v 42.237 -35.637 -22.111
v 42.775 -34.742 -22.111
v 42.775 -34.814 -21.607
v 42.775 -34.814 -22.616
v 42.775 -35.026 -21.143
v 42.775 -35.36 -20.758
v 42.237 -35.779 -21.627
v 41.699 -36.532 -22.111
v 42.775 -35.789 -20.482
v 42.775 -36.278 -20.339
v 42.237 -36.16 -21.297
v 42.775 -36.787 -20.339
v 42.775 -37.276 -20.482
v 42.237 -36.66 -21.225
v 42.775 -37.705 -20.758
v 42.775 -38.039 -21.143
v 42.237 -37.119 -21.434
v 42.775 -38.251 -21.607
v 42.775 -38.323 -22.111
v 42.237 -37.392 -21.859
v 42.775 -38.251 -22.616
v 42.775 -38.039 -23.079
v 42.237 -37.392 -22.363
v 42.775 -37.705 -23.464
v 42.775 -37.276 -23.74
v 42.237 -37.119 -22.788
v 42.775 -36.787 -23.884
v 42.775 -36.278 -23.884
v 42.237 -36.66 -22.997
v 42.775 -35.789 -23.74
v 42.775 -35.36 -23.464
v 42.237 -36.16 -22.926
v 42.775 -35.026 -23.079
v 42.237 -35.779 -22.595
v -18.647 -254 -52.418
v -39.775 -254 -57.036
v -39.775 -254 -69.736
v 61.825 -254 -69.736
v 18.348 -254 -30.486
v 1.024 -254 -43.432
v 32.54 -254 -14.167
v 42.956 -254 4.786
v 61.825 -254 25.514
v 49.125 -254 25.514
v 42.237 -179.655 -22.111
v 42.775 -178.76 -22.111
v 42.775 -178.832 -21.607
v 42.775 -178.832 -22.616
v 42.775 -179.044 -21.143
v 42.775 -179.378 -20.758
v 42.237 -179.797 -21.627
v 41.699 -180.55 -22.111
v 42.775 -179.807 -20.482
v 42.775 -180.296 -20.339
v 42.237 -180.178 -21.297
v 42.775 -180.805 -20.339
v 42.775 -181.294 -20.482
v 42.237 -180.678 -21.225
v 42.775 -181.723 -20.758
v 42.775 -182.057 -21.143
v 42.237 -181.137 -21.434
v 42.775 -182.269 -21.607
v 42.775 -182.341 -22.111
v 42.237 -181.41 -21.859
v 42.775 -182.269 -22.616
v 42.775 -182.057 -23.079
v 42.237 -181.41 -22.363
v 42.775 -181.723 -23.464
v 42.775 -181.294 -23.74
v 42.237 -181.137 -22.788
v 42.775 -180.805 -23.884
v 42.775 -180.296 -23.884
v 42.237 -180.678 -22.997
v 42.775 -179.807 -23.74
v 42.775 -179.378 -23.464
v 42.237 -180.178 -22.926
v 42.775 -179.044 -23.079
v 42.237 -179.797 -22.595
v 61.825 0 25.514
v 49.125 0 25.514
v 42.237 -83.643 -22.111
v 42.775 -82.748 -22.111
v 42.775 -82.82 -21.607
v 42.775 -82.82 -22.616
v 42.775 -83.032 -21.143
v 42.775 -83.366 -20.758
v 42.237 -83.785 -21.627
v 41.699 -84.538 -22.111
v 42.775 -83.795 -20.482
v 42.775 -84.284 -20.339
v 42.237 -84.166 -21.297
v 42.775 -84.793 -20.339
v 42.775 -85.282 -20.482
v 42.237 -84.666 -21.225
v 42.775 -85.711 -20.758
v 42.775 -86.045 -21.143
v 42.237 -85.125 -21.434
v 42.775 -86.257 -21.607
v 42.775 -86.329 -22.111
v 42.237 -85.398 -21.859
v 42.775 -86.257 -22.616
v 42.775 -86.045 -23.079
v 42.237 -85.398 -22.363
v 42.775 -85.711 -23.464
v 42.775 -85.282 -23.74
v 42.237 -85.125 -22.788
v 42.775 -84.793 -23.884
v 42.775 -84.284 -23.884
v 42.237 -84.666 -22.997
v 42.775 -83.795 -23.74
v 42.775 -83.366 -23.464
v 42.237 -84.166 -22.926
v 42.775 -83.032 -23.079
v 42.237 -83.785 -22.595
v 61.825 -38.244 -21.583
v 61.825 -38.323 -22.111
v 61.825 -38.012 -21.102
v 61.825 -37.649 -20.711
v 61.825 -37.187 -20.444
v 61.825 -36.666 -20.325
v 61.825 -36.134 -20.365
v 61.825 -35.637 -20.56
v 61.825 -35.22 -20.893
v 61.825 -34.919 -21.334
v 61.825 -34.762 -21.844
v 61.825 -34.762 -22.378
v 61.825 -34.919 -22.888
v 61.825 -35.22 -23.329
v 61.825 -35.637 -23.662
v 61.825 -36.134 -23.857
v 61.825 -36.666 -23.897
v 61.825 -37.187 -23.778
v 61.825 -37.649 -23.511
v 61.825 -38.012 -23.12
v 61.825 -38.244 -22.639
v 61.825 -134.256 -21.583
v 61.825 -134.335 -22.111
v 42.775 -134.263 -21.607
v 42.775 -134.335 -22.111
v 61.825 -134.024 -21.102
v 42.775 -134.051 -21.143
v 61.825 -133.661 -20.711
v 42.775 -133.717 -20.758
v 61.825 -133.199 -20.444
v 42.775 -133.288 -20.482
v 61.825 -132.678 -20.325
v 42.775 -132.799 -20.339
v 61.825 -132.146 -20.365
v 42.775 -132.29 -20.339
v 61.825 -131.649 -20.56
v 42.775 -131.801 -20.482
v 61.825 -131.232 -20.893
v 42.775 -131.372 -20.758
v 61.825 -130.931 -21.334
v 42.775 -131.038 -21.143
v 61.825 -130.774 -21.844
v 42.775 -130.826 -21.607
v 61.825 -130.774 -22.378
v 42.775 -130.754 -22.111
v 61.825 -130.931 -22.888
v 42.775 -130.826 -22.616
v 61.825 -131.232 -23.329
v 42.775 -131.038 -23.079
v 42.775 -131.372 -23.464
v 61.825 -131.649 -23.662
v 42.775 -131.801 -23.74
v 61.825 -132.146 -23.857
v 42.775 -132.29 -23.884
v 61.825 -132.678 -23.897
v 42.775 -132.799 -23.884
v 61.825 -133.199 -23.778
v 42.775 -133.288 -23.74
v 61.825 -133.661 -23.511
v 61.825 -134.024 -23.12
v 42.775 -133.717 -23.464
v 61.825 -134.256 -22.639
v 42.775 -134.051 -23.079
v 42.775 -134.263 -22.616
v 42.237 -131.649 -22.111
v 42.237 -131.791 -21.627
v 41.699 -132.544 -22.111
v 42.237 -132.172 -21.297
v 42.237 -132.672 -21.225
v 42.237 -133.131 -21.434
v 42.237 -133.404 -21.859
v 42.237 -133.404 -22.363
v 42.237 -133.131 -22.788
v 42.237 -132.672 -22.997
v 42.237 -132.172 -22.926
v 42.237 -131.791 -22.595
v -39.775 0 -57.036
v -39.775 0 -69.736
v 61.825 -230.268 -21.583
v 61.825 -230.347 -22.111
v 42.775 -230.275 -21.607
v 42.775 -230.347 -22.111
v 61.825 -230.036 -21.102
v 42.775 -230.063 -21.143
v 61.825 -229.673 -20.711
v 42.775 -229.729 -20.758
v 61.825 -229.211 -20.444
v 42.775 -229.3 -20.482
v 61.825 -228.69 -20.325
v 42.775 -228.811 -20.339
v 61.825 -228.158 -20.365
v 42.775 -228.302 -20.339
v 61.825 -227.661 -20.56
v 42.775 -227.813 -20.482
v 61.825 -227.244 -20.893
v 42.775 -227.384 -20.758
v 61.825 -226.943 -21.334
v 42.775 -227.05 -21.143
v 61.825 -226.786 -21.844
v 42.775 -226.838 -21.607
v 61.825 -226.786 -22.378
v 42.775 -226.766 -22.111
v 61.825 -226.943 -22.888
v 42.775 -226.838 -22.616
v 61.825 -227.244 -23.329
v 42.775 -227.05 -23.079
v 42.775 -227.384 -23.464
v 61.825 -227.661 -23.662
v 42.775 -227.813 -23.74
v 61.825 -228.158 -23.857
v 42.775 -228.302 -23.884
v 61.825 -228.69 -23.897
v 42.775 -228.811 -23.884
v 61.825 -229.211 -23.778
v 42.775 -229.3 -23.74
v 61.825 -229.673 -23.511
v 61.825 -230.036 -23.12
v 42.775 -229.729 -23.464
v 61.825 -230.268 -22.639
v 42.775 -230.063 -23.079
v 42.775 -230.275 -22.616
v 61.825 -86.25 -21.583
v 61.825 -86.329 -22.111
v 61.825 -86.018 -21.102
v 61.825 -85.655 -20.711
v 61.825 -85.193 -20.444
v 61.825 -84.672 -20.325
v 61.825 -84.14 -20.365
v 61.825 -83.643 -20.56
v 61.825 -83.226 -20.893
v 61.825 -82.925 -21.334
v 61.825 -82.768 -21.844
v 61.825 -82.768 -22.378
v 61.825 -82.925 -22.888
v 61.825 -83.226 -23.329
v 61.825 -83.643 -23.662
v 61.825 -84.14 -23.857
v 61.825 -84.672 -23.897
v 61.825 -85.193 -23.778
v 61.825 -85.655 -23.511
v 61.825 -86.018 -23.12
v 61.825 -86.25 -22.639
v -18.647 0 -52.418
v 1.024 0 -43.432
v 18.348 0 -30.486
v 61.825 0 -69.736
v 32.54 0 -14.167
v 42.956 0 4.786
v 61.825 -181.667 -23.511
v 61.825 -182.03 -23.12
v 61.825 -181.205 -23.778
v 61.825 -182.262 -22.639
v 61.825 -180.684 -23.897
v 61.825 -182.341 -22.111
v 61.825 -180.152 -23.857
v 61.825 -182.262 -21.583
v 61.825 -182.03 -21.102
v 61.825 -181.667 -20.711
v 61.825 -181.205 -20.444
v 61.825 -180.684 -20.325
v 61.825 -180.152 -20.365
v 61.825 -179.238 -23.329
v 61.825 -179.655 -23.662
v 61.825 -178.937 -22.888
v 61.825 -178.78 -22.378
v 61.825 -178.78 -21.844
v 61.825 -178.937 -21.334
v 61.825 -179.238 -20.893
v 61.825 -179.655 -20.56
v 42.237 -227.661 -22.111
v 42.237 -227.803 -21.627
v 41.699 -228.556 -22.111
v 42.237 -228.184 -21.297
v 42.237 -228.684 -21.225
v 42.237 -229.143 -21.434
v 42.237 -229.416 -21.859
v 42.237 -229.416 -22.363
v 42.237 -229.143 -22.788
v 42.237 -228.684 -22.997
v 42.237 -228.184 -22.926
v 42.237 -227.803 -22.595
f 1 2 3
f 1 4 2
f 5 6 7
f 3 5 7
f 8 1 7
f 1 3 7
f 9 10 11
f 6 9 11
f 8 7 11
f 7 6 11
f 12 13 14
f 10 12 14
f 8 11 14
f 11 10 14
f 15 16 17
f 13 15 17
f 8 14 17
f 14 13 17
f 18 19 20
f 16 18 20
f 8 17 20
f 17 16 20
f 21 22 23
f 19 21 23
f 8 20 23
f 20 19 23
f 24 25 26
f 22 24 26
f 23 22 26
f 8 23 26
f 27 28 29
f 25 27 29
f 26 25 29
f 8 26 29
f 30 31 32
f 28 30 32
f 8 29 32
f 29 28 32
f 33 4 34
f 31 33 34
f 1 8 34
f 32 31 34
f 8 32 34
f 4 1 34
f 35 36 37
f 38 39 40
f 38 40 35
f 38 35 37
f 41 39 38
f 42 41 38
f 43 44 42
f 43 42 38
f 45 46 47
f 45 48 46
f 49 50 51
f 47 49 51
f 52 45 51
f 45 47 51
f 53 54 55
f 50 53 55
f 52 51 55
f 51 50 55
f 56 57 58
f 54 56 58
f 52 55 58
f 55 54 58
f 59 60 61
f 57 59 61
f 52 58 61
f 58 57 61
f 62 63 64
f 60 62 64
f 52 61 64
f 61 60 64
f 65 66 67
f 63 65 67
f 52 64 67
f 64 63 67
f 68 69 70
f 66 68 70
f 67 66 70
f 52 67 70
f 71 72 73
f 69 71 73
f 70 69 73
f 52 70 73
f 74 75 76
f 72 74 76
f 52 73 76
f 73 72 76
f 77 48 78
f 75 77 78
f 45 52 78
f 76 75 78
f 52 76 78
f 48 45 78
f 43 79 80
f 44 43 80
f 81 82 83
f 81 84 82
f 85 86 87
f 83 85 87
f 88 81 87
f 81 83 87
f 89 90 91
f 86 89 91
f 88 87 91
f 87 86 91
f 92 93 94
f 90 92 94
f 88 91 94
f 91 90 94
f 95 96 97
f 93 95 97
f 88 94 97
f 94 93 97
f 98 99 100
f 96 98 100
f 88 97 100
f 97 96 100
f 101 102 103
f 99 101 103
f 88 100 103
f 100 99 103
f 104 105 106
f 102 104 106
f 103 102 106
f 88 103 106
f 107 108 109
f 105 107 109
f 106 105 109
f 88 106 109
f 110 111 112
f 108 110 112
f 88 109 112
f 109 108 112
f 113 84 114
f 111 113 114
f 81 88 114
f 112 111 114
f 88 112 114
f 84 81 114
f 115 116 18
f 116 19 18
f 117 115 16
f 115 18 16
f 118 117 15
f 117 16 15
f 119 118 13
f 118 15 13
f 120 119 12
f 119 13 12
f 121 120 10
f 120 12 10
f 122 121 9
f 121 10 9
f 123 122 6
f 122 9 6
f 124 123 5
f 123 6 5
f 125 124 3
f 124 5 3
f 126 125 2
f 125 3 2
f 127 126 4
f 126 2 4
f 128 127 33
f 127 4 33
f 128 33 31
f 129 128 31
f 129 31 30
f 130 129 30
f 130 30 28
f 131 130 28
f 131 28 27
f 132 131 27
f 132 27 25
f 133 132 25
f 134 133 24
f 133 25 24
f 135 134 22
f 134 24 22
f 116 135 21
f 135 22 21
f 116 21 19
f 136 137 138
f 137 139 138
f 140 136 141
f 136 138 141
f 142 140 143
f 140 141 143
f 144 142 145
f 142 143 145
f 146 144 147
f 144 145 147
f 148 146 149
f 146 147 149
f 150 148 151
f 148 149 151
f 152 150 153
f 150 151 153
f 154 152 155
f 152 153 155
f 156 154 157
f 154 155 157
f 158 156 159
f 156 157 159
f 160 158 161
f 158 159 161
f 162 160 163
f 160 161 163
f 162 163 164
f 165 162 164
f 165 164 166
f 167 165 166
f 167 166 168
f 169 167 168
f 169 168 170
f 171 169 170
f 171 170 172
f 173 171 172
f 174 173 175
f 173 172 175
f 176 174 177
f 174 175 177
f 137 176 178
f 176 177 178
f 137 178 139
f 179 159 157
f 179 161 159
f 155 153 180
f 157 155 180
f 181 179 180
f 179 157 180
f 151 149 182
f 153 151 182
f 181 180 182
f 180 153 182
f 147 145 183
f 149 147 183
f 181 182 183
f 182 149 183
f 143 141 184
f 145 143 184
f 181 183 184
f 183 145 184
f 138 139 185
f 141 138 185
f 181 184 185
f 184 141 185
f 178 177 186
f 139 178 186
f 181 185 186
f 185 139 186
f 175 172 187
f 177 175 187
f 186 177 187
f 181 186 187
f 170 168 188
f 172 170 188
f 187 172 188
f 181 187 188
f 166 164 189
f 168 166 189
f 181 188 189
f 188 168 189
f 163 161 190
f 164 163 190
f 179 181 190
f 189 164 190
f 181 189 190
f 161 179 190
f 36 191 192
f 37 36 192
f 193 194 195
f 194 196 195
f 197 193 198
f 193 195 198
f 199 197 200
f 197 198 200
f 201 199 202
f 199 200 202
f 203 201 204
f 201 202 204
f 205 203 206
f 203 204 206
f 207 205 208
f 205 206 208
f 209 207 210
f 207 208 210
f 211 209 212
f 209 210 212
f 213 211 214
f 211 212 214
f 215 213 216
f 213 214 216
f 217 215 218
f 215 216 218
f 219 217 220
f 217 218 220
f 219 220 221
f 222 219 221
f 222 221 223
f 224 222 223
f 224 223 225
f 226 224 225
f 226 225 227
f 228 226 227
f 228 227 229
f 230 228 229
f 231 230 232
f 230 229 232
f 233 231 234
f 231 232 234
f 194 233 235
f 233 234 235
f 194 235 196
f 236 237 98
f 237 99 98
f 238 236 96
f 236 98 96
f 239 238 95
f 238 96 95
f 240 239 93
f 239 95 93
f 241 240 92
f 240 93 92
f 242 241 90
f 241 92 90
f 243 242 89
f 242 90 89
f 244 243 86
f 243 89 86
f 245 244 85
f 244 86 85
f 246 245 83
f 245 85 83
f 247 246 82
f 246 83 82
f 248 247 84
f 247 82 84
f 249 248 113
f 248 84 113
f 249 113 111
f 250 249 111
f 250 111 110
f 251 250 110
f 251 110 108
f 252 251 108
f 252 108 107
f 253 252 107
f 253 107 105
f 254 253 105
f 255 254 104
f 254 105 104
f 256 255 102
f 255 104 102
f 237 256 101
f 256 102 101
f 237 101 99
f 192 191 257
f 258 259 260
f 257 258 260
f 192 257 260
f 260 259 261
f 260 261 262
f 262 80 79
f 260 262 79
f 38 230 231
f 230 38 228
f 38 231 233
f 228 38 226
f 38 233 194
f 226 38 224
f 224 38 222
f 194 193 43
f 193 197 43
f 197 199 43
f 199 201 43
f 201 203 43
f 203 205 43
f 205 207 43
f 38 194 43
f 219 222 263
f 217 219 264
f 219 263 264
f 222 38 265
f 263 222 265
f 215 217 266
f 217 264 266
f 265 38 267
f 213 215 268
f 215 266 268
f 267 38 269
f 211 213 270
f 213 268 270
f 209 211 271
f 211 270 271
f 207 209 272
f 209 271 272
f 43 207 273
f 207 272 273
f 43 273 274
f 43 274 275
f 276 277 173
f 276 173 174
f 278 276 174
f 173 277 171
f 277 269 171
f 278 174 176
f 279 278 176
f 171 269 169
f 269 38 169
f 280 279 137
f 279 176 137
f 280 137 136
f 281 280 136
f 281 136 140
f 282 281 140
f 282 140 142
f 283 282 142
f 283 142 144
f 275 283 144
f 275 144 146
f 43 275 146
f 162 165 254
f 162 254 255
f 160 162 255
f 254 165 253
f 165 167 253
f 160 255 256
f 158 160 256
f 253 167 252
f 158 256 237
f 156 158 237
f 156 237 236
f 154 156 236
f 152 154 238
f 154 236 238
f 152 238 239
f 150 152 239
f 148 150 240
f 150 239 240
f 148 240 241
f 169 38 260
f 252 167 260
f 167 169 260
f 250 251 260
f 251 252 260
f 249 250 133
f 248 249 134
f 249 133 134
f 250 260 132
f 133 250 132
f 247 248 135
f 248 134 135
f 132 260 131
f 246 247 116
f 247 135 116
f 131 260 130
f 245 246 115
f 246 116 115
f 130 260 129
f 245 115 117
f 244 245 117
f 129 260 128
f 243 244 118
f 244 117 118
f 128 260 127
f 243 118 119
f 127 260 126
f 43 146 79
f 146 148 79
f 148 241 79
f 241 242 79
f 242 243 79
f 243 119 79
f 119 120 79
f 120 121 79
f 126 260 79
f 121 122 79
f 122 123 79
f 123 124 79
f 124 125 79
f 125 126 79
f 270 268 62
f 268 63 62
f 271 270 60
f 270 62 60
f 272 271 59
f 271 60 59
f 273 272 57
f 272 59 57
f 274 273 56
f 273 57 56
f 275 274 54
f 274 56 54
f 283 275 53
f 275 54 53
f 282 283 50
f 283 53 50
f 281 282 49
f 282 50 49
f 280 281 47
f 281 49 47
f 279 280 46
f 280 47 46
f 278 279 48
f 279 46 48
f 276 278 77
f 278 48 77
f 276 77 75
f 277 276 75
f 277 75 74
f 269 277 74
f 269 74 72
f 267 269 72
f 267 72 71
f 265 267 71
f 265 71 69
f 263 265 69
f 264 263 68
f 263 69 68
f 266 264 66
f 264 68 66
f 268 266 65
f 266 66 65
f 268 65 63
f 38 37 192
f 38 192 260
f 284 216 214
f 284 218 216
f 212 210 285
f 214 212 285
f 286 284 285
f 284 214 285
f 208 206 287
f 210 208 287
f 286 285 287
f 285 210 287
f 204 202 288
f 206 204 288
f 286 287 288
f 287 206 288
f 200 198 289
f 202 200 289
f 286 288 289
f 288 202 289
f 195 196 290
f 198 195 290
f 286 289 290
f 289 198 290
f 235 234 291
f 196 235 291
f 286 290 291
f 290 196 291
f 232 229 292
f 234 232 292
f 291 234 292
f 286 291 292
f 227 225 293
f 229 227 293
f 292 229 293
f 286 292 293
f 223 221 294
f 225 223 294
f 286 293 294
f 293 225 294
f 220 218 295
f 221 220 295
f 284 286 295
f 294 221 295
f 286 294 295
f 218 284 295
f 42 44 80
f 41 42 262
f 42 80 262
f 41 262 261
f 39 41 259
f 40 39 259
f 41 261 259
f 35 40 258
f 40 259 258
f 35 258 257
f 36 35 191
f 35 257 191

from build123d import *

# Parameters (mm, degrees)
F1_DEPTH = 254
F3_D     = 3.5814
F3_DEPTH = 19.05
F3_TIP   = 1.0759611105


with BuildPart() as f1:
    # F0 (on Front) → F1 (new body)
    with BuildSketch(Plane.XZ):
        Polygon((49.1248931152, -56.7675527828), (-39.7751068848, -57.0361235134), (48.4362465841, -57.0361235134), (49.1248931152, -57.0361235134), align=None)
        with BuildLine():
            ThreePointArc((49.1248931152, 25.5138764866), (18.3482789064, -30.4863082116), (-39.7751068848, -57.0361235134))
            Line((-39.7751068848, -57.0361235134), (49.1248931152, -56.7675527828))
            Line((49.1248931152, -56.7675527828), (49.1248931152, 25.5138764866))
        make_face()
        Polygon((48.4362465841, -57.0361235134), (-39.7751068848, -57.0361235134), (-39.7751068848, -69.7361235134), (61.8248931152, -69.7361235134), (61.8248931152, -57.0361235134), (55.4748931152, -57.0361235134), (49.1248931152, -57.0361235134), align=None)
        Polygon((49.1248931152, 25.5138764866), (49.1248931152, -56.7675527828), (49.1248931152, -57.0361235134), (55.4748931152, -57.0361235134), (61.8248931152, -57.0361235134), (61.8248931152, 25.5138764866), align=None)
    extrude(amount=F1_DEPTH)

    # F3
    with Locations(Plane.YZ.offset(61.8248931152)):
        with Locations((-228.5564392805, -22.1111235134), (-180.5504392805, -22.1111235134), (-132.5444392805, -22.1111235134), (-84.5384392805, -22.1111235134), (-36.5324392805, -22.1111235134)):
            Hole(F3_D / 2, depth=F3_DEPTH)
            with Locations((0, 0, -(F3_DEPTH + F3_TIP / 2))):  # 118° drill point
                Cone(0, F3_D / 2, F3_TIP, mode=Mode.SUBTRACT)


solid = f1.part
